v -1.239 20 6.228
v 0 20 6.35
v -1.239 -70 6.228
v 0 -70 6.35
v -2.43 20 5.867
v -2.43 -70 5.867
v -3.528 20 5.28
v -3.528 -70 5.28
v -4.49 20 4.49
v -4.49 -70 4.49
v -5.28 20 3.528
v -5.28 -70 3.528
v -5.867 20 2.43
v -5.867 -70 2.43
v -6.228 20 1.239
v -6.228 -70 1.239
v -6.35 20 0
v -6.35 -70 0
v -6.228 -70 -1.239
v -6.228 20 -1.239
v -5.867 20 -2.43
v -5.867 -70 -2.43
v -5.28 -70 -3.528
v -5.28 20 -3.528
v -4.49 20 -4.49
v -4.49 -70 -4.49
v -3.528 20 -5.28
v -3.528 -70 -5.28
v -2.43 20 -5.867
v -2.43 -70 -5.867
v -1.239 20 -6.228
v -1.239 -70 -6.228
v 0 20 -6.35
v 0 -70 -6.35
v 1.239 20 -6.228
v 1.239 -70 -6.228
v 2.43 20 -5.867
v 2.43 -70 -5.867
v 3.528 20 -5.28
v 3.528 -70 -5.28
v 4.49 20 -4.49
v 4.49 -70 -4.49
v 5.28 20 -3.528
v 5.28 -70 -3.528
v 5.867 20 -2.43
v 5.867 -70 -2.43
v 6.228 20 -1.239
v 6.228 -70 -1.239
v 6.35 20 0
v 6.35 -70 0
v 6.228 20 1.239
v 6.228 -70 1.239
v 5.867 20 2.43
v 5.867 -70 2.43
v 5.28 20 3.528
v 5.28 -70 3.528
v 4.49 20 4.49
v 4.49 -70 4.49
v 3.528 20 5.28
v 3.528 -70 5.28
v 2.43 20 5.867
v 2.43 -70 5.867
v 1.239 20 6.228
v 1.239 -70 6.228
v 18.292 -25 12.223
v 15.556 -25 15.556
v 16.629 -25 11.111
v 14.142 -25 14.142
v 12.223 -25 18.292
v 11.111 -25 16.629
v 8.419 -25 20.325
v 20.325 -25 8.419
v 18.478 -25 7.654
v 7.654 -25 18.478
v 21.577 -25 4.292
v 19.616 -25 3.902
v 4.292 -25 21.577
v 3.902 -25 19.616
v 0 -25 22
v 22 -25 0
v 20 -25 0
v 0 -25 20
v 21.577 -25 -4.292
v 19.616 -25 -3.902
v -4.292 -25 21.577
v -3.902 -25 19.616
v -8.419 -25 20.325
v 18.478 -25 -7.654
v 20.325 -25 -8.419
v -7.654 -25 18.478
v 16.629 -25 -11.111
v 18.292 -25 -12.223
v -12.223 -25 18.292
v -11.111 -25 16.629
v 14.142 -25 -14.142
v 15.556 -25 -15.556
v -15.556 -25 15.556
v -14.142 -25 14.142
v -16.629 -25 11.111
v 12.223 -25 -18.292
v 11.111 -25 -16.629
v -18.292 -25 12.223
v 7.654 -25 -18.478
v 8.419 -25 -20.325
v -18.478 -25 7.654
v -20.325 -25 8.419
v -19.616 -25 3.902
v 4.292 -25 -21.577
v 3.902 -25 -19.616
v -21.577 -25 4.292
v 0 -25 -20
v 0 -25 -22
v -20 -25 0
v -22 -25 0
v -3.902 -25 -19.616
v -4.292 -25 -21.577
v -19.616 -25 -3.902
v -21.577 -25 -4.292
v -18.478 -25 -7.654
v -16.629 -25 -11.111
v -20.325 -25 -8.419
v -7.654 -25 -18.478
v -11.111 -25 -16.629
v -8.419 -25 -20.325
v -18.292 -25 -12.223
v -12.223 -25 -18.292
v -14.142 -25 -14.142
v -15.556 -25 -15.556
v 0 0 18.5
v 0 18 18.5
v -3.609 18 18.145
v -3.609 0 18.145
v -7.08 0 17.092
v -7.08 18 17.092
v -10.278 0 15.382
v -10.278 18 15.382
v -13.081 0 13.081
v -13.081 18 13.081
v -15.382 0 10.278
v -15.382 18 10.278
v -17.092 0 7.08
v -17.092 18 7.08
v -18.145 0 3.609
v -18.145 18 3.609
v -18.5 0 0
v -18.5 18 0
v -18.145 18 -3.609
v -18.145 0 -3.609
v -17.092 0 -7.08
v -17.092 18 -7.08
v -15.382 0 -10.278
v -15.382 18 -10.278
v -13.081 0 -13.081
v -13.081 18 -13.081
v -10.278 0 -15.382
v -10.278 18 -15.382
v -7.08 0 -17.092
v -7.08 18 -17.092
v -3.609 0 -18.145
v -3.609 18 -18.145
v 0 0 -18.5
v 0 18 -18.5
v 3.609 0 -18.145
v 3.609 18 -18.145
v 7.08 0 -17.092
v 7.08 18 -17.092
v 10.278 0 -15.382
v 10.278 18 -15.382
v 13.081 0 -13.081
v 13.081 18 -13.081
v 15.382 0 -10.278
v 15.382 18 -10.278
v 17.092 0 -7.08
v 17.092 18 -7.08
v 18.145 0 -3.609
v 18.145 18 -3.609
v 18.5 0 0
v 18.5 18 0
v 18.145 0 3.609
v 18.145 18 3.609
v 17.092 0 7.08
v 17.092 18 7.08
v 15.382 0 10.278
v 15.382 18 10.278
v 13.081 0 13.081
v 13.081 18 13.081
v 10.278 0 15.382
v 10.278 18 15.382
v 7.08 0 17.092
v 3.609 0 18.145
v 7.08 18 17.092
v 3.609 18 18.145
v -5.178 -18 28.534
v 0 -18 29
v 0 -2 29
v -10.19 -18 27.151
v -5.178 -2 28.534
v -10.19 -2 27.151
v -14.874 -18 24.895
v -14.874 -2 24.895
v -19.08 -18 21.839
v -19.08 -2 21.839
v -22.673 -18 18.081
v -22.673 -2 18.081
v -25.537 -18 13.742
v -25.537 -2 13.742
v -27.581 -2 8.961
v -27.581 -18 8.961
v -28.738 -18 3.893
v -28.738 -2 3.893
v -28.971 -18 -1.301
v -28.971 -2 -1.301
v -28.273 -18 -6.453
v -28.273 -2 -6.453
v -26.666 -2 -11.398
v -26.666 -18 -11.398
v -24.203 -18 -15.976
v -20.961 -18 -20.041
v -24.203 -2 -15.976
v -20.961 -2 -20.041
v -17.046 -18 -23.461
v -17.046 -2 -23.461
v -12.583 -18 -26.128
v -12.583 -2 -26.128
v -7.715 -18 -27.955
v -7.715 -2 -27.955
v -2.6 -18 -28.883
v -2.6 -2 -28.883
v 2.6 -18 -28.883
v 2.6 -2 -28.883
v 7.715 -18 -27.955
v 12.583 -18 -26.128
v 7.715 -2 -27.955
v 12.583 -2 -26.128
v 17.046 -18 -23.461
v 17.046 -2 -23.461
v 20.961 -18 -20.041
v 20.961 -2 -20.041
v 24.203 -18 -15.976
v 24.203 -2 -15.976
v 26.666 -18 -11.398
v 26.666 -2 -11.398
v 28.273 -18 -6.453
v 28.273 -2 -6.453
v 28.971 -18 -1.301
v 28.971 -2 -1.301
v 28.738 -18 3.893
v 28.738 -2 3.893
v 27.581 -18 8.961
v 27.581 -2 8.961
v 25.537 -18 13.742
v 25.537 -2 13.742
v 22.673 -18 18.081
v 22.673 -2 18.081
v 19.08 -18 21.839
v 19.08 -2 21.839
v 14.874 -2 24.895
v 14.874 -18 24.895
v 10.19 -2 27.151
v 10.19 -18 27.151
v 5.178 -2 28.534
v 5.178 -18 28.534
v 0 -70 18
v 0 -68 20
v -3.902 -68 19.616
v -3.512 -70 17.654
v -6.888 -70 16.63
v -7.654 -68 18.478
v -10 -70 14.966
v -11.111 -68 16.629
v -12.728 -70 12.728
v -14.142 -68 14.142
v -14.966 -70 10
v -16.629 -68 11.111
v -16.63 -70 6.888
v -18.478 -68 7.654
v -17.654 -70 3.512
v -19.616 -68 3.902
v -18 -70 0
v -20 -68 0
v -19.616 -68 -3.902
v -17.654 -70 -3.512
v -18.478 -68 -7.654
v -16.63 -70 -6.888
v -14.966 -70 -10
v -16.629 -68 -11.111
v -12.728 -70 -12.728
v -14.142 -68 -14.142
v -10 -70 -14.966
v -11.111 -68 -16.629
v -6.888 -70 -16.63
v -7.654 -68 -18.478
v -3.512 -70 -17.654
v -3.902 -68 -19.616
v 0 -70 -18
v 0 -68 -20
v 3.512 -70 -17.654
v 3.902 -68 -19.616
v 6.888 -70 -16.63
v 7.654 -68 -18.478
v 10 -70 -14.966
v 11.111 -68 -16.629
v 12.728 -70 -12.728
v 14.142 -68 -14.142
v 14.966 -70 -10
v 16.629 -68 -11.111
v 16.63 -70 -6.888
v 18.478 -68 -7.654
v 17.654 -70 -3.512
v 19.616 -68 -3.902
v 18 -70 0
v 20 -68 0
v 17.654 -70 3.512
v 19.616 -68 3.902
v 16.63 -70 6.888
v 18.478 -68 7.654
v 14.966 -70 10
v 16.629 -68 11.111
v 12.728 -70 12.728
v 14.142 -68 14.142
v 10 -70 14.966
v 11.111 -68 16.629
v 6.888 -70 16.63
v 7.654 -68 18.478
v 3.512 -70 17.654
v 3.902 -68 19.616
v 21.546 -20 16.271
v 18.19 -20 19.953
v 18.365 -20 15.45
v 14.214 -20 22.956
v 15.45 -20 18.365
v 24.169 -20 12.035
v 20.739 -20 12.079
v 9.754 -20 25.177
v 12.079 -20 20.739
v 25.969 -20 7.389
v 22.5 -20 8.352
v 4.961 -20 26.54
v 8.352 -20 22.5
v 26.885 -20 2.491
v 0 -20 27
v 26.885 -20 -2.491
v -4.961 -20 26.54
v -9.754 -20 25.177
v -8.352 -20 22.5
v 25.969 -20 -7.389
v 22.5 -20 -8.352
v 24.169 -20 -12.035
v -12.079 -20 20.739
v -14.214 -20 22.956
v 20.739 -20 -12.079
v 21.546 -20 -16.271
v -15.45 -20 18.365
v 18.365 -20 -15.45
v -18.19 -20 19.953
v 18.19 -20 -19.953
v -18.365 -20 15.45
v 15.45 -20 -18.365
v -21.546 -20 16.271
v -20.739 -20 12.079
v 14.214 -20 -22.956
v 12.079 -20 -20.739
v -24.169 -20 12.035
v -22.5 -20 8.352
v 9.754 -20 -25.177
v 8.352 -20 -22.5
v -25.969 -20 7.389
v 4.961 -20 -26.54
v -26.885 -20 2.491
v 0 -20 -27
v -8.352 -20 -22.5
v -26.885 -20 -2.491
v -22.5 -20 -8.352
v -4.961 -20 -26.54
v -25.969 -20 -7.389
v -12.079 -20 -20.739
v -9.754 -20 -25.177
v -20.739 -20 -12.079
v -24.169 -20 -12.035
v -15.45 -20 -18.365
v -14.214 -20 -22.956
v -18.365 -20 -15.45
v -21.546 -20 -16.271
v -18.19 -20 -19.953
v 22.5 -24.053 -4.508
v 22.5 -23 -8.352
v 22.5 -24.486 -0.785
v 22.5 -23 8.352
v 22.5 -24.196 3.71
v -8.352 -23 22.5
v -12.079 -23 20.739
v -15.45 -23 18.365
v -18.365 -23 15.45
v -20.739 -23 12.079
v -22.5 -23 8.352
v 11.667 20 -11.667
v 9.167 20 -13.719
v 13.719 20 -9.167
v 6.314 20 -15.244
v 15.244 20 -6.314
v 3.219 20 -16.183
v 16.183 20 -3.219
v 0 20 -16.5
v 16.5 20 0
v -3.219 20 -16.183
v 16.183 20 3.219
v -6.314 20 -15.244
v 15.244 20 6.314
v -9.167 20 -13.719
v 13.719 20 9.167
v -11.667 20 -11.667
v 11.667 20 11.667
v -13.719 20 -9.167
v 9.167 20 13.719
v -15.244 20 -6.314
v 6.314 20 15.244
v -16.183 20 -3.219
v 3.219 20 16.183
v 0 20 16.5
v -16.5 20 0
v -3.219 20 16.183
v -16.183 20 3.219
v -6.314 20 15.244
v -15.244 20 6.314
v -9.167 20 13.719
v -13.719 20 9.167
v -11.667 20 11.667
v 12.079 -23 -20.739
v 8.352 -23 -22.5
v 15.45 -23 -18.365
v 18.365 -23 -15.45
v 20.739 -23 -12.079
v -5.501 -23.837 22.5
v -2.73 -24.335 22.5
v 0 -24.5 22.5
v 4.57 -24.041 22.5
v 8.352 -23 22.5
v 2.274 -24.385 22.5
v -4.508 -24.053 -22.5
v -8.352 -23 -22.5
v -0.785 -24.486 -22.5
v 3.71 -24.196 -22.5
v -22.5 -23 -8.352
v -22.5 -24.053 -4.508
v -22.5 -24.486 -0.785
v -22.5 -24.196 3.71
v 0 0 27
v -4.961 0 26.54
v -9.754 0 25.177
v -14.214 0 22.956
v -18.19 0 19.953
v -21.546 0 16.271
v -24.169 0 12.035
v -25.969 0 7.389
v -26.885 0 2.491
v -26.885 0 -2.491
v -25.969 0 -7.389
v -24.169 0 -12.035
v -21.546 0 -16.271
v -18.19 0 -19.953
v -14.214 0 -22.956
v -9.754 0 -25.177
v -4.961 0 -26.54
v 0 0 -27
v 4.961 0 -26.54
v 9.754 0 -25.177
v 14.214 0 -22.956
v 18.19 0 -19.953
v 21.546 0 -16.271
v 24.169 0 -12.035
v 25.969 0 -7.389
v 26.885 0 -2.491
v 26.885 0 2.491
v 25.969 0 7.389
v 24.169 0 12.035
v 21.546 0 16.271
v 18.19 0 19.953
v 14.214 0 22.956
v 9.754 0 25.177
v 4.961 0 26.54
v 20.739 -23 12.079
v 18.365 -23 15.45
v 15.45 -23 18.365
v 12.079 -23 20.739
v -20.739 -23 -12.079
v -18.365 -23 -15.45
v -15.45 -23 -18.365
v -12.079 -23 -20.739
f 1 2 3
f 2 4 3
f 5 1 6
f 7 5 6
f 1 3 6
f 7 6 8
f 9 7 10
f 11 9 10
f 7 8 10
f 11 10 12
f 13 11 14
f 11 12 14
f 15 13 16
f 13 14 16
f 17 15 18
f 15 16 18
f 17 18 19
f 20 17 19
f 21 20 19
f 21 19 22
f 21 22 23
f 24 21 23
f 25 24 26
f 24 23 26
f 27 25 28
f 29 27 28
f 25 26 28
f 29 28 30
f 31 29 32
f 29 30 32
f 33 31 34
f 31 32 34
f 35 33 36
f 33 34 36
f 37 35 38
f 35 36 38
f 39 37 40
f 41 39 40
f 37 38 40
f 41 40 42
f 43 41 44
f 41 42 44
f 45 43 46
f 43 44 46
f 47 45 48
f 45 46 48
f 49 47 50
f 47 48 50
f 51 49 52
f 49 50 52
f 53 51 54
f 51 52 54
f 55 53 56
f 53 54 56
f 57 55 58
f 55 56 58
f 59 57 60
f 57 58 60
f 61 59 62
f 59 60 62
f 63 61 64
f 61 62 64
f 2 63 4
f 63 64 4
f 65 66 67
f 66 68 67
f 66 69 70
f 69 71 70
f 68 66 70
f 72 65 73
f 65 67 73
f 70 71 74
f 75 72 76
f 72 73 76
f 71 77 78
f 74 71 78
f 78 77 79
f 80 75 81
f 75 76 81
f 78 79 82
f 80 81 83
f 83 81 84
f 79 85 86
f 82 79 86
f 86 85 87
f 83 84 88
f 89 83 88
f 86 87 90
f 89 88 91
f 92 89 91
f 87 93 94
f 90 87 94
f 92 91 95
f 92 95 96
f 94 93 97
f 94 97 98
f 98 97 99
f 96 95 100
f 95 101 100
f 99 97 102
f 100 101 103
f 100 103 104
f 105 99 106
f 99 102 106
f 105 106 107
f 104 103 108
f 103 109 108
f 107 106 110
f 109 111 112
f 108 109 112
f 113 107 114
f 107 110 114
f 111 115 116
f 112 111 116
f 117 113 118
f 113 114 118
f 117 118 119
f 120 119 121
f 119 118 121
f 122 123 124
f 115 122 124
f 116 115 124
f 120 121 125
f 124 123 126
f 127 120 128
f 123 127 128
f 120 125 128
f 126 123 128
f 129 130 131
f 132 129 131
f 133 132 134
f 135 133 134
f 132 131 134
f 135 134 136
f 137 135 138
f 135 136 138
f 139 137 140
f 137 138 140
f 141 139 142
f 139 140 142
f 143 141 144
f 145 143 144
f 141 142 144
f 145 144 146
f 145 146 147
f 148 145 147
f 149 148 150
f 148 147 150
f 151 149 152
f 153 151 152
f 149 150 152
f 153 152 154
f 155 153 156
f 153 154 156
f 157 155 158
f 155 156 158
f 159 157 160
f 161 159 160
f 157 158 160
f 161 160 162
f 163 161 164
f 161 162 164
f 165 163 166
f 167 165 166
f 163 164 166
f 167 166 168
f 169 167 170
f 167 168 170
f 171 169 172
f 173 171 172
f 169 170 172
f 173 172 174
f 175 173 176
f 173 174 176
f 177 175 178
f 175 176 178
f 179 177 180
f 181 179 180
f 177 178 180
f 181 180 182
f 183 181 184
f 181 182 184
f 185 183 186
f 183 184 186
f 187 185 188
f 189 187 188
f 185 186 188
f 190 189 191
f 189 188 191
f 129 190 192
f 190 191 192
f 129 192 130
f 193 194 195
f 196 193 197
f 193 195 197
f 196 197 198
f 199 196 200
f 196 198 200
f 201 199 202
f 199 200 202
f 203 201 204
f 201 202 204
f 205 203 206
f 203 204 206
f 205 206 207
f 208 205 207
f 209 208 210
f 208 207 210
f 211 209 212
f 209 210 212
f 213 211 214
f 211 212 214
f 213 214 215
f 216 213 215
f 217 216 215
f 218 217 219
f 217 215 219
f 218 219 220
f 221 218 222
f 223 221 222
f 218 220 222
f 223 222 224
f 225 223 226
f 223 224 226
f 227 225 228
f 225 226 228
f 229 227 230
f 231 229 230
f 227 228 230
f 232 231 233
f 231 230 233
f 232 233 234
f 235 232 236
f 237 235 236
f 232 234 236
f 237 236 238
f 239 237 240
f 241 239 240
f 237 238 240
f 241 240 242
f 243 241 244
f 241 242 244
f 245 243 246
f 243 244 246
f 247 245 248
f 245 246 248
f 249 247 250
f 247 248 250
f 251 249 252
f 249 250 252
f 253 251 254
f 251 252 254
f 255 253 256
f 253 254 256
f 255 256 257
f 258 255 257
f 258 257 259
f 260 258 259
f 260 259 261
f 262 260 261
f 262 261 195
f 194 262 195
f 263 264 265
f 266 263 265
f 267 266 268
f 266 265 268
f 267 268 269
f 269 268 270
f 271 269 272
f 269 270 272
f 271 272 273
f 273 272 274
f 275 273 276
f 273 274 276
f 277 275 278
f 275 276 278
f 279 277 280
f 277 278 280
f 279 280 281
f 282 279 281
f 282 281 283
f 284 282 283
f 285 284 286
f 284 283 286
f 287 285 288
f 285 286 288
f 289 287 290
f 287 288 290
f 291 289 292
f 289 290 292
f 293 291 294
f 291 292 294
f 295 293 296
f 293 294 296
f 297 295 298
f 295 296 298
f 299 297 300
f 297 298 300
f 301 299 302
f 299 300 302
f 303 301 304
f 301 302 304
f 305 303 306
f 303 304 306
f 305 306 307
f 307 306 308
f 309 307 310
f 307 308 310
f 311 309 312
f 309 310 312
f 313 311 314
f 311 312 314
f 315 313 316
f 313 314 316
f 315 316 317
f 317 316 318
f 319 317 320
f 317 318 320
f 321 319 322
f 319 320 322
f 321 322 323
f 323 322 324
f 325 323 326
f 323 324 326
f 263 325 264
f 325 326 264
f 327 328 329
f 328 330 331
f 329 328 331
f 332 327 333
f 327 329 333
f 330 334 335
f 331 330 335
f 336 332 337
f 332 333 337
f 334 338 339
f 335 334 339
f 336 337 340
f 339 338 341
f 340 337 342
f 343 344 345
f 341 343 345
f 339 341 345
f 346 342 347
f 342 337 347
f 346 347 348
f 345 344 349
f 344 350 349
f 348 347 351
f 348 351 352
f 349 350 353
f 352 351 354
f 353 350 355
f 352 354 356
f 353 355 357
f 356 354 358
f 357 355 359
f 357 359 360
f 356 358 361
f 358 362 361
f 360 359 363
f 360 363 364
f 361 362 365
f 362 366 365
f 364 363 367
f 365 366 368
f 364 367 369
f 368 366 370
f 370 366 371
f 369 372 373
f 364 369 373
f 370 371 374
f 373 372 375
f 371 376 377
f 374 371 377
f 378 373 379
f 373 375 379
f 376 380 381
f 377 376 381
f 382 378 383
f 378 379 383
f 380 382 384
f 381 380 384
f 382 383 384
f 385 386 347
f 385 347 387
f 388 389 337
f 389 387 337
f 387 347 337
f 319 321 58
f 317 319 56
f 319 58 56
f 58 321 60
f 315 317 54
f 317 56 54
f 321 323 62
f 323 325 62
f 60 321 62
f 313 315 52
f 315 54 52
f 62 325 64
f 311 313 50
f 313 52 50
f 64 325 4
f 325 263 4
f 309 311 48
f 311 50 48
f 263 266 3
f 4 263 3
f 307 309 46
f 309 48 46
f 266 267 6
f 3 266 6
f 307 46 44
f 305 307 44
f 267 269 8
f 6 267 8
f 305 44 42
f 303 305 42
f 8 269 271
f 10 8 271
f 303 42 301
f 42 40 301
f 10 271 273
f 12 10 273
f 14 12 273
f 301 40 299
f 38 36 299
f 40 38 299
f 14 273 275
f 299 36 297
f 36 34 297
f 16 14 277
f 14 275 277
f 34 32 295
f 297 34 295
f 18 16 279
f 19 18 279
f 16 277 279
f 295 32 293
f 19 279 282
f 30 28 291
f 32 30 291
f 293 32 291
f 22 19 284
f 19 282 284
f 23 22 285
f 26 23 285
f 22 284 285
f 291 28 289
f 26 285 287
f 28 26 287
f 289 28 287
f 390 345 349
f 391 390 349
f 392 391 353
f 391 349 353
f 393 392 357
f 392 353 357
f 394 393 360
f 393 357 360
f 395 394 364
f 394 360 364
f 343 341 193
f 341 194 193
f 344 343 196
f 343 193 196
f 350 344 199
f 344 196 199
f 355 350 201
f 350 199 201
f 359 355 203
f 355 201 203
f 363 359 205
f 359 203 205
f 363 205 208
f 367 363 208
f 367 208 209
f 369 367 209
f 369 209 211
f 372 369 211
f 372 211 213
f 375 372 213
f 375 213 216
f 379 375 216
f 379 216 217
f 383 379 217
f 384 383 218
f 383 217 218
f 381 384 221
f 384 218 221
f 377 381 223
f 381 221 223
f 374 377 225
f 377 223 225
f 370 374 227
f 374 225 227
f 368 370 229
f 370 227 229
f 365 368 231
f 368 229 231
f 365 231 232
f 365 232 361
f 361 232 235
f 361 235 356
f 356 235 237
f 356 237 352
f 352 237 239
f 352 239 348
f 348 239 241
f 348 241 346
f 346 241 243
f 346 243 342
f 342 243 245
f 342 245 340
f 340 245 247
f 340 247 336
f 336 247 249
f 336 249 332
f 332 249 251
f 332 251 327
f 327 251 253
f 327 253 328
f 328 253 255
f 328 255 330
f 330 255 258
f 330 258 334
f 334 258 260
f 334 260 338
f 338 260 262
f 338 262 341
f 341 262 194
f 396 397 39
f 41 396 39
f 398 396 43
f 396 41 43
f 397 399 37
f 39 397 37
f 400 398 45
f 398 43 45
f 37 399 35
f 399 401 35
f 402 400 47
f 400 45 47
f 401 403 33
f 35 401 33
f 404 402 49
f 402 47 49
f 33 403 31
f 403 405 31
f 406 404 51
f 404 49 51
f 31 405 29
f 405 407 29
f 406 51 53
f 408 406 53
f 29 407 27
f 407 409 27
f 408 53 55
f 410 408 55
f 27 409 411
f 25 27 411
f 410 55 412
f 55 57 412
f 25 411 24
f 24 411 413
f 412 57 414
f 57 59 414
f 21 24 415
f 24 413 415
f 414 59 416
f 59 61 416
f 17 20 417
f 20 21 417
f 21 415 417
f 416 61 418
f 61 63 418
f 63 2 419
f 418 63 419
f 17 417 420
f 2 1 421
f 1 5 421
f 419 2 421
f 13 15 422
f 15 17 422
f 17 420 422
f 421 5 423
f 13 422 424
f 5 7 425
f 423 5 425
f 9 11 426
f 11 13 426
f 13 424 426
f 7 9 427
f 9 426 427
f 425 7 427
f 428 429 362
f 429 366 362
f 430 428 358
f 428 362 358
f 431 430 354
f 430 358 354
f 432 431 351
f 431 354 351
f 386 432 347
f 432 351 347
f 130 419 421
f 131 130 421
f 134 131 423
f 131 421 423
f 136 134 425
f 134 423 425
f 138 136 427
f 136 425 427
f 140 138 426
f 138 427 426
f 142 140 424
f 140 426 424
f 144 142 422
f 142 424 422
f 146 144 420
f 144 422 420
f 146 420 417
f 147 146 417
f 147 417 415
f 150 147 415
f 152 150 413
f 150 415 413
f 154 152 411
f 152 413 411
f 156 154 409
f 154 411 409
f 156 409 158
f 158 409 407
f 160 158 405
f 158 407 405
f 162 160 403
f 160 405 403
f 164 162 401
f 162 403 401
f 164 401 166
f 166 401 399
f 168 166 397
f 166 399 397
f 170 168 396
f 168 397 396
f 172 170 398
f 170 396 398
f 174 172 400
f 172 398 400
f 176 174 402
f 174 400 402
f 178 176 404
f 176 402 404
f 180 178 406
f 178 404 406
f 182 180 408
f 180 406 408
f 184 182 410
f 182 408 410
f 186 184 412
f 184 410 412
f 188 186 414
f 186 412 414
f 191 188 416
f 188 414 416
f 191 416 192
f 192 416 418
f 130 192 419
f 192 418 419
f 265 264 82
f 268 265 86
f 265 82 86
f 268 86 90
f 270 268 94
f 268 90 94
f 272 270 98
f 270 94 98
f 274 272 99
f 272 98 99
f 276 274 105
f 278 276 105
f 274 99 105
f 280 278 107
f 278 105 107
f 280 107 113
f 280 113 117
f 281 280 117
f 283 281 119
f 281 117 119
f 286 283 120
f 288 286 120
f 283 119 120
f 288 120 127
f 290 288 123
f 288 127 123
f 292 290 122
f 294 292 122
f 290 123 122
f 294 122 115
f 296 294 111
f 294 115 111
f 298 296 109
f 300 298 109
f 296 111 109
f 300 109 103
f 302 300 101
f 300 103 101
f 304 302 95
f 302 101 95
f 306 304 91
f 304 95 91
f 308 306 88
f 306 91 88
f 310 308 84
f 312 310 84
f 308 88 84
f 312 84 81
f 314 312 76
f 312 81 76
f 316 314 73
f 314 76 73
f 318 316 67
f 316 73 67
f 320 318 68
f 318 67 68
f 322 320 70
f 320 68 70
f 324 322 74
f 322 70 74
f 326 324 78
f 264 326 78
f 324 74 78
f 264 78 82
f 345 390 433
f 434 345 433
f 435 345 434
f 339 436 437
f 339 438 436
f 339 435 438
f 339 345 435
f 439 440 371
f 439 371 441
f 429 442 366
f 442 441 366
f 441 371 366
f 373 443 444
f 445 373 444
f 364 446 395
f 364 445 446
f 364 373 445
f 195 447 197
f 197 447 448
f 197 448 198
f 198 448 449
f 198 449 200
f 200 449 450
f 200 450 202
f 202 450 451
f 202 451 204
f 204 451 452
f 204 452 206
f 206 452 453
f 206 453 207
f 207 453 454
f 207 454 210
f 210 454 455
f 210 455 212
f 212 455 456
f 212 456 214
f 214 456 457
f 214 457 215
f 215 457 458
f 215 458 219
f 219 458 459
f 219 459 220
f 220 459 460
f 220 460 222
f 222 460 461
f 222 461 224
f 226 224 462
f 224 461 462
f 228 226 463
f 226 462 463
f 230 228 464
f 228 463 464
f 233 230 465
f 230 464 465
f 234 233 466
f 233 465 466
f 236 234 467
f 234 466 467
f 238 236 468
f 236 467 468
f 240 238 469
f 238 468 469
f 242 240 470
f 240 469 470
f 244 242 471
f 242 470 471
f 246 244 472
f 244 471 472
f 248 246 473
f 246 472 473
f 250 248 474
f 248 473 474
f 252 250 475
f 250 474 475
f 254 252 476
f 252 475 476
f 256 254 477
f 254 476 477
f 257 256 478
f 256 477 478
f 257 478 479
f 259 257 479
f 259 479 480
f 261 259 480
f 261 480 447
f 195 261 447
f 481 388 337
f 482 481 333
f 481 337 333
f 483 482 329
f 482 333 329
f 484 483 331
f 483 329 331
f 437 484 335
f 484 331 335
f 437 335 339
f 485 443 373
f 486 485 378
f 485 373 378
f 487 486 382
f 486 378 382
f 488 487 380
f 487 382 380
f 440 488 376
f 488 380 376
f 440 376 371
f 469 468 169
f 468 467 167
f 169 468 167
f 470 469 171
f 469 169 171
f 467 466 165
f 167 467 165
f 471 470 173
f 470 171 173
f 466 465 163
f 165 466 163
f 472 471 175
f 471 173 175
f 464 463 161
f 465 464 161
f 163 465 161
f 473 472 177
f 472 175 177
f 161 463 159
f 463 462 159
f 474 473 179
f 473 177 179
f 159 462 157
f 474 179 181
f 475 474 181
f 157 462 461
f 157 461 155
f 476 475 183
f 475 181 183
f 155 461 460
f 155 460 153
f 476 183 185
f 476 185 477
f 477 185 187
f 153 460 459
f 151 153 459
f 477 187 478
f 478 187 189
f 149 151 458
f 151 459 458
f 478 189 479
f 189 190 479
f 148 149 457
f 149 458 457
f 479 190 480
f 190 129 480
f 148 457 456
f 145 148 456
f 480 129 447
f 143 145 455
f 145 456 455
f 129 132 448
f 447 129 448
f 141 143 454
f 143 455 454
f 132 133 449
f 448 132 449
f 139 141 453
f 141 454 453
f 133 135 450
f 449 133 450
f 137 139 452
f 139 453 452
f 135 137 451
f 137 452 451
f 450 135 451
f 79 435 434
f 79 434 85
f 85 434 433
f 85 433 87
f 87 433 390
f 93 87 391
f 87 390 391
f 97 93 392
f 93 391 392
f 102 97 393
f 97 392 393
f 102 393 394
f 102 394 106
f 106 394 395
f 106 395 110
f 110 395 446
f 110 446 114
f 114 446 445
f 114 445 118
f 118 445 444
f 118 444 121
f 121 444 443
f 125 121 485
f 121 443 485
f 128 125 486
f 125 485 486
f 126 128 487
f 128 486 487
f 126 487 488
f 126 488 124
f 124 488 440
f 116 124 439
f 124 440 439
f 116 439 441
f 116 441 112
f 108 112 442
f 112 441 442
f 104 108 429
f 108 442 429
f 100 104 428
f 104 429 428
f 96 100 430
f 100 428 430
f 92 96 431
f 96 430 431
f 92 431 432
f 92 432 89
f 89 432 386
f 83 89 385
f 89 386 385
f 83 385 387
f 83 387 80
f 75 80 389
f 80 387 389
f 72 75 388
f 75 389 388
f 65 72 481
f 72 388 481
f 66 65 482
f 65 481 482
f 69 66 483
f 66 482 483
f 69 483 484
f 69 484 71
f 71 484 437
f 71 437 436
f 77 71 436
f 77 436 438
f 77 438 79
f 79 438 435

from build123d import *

# Parameters (mm, degrees)
CHAMFER1_SIZE       = 2
SKETCH2_OUTSIDE_W   = 84.354
SKETCH2_OUTSIDE_H   = 84.354
SKETCH2_OUTSIDE_W_2 = 45
SKETCH2_OUTSIDE_H_2 = 45
CUT_EXTRUDE1_DEPTH  = 65.668384857


with BuildPart() as part:
    # Sketch1 → Revolve2 (revolve)
    with BuildSketch(Plane.XY):
        Polygon((18.5, 0), (18.5, 20), (6.35, 20), (6.35, -70), (20, -70), (20, -25), (24, -25), (24, -20), (29, -20), (29, 0), align=None)
    revolve(axis=Axis((0, 38.250415552, 0), (0, -1, 0)))

    # Chamfer1
    chamfer1_edges = [part.edges().sort_by_distance(p)[0] for p in [
        (-18.5, 20, 0),
        (-29, 0, 0),
        (-20, -70, 0),
        (-24, -25, 0),
        (-29, -20, 0),
    ]]
    chamfer(chamfer1_edges, length=CHAMFER1_SIZE)

    # Sketch2 outside → Cut-Extrude1 (cut, through all)
    with BuildSketch(Plane.XZ.offset(20)):
        Rectangle(SKETCH2_OUTSIDE_W, SKETCH2_OUTSIDE_H)
        Rectangle(SKETCH2_OUTSIDE_W_2, SKETCH2_OUTSIDE_H_2, mode=Mode.SUBTRACT)
    extrude(amount=CUT_EXTRUDE1_DEPTH, mode=Mode.SUBTRACT)


solid = part.part
